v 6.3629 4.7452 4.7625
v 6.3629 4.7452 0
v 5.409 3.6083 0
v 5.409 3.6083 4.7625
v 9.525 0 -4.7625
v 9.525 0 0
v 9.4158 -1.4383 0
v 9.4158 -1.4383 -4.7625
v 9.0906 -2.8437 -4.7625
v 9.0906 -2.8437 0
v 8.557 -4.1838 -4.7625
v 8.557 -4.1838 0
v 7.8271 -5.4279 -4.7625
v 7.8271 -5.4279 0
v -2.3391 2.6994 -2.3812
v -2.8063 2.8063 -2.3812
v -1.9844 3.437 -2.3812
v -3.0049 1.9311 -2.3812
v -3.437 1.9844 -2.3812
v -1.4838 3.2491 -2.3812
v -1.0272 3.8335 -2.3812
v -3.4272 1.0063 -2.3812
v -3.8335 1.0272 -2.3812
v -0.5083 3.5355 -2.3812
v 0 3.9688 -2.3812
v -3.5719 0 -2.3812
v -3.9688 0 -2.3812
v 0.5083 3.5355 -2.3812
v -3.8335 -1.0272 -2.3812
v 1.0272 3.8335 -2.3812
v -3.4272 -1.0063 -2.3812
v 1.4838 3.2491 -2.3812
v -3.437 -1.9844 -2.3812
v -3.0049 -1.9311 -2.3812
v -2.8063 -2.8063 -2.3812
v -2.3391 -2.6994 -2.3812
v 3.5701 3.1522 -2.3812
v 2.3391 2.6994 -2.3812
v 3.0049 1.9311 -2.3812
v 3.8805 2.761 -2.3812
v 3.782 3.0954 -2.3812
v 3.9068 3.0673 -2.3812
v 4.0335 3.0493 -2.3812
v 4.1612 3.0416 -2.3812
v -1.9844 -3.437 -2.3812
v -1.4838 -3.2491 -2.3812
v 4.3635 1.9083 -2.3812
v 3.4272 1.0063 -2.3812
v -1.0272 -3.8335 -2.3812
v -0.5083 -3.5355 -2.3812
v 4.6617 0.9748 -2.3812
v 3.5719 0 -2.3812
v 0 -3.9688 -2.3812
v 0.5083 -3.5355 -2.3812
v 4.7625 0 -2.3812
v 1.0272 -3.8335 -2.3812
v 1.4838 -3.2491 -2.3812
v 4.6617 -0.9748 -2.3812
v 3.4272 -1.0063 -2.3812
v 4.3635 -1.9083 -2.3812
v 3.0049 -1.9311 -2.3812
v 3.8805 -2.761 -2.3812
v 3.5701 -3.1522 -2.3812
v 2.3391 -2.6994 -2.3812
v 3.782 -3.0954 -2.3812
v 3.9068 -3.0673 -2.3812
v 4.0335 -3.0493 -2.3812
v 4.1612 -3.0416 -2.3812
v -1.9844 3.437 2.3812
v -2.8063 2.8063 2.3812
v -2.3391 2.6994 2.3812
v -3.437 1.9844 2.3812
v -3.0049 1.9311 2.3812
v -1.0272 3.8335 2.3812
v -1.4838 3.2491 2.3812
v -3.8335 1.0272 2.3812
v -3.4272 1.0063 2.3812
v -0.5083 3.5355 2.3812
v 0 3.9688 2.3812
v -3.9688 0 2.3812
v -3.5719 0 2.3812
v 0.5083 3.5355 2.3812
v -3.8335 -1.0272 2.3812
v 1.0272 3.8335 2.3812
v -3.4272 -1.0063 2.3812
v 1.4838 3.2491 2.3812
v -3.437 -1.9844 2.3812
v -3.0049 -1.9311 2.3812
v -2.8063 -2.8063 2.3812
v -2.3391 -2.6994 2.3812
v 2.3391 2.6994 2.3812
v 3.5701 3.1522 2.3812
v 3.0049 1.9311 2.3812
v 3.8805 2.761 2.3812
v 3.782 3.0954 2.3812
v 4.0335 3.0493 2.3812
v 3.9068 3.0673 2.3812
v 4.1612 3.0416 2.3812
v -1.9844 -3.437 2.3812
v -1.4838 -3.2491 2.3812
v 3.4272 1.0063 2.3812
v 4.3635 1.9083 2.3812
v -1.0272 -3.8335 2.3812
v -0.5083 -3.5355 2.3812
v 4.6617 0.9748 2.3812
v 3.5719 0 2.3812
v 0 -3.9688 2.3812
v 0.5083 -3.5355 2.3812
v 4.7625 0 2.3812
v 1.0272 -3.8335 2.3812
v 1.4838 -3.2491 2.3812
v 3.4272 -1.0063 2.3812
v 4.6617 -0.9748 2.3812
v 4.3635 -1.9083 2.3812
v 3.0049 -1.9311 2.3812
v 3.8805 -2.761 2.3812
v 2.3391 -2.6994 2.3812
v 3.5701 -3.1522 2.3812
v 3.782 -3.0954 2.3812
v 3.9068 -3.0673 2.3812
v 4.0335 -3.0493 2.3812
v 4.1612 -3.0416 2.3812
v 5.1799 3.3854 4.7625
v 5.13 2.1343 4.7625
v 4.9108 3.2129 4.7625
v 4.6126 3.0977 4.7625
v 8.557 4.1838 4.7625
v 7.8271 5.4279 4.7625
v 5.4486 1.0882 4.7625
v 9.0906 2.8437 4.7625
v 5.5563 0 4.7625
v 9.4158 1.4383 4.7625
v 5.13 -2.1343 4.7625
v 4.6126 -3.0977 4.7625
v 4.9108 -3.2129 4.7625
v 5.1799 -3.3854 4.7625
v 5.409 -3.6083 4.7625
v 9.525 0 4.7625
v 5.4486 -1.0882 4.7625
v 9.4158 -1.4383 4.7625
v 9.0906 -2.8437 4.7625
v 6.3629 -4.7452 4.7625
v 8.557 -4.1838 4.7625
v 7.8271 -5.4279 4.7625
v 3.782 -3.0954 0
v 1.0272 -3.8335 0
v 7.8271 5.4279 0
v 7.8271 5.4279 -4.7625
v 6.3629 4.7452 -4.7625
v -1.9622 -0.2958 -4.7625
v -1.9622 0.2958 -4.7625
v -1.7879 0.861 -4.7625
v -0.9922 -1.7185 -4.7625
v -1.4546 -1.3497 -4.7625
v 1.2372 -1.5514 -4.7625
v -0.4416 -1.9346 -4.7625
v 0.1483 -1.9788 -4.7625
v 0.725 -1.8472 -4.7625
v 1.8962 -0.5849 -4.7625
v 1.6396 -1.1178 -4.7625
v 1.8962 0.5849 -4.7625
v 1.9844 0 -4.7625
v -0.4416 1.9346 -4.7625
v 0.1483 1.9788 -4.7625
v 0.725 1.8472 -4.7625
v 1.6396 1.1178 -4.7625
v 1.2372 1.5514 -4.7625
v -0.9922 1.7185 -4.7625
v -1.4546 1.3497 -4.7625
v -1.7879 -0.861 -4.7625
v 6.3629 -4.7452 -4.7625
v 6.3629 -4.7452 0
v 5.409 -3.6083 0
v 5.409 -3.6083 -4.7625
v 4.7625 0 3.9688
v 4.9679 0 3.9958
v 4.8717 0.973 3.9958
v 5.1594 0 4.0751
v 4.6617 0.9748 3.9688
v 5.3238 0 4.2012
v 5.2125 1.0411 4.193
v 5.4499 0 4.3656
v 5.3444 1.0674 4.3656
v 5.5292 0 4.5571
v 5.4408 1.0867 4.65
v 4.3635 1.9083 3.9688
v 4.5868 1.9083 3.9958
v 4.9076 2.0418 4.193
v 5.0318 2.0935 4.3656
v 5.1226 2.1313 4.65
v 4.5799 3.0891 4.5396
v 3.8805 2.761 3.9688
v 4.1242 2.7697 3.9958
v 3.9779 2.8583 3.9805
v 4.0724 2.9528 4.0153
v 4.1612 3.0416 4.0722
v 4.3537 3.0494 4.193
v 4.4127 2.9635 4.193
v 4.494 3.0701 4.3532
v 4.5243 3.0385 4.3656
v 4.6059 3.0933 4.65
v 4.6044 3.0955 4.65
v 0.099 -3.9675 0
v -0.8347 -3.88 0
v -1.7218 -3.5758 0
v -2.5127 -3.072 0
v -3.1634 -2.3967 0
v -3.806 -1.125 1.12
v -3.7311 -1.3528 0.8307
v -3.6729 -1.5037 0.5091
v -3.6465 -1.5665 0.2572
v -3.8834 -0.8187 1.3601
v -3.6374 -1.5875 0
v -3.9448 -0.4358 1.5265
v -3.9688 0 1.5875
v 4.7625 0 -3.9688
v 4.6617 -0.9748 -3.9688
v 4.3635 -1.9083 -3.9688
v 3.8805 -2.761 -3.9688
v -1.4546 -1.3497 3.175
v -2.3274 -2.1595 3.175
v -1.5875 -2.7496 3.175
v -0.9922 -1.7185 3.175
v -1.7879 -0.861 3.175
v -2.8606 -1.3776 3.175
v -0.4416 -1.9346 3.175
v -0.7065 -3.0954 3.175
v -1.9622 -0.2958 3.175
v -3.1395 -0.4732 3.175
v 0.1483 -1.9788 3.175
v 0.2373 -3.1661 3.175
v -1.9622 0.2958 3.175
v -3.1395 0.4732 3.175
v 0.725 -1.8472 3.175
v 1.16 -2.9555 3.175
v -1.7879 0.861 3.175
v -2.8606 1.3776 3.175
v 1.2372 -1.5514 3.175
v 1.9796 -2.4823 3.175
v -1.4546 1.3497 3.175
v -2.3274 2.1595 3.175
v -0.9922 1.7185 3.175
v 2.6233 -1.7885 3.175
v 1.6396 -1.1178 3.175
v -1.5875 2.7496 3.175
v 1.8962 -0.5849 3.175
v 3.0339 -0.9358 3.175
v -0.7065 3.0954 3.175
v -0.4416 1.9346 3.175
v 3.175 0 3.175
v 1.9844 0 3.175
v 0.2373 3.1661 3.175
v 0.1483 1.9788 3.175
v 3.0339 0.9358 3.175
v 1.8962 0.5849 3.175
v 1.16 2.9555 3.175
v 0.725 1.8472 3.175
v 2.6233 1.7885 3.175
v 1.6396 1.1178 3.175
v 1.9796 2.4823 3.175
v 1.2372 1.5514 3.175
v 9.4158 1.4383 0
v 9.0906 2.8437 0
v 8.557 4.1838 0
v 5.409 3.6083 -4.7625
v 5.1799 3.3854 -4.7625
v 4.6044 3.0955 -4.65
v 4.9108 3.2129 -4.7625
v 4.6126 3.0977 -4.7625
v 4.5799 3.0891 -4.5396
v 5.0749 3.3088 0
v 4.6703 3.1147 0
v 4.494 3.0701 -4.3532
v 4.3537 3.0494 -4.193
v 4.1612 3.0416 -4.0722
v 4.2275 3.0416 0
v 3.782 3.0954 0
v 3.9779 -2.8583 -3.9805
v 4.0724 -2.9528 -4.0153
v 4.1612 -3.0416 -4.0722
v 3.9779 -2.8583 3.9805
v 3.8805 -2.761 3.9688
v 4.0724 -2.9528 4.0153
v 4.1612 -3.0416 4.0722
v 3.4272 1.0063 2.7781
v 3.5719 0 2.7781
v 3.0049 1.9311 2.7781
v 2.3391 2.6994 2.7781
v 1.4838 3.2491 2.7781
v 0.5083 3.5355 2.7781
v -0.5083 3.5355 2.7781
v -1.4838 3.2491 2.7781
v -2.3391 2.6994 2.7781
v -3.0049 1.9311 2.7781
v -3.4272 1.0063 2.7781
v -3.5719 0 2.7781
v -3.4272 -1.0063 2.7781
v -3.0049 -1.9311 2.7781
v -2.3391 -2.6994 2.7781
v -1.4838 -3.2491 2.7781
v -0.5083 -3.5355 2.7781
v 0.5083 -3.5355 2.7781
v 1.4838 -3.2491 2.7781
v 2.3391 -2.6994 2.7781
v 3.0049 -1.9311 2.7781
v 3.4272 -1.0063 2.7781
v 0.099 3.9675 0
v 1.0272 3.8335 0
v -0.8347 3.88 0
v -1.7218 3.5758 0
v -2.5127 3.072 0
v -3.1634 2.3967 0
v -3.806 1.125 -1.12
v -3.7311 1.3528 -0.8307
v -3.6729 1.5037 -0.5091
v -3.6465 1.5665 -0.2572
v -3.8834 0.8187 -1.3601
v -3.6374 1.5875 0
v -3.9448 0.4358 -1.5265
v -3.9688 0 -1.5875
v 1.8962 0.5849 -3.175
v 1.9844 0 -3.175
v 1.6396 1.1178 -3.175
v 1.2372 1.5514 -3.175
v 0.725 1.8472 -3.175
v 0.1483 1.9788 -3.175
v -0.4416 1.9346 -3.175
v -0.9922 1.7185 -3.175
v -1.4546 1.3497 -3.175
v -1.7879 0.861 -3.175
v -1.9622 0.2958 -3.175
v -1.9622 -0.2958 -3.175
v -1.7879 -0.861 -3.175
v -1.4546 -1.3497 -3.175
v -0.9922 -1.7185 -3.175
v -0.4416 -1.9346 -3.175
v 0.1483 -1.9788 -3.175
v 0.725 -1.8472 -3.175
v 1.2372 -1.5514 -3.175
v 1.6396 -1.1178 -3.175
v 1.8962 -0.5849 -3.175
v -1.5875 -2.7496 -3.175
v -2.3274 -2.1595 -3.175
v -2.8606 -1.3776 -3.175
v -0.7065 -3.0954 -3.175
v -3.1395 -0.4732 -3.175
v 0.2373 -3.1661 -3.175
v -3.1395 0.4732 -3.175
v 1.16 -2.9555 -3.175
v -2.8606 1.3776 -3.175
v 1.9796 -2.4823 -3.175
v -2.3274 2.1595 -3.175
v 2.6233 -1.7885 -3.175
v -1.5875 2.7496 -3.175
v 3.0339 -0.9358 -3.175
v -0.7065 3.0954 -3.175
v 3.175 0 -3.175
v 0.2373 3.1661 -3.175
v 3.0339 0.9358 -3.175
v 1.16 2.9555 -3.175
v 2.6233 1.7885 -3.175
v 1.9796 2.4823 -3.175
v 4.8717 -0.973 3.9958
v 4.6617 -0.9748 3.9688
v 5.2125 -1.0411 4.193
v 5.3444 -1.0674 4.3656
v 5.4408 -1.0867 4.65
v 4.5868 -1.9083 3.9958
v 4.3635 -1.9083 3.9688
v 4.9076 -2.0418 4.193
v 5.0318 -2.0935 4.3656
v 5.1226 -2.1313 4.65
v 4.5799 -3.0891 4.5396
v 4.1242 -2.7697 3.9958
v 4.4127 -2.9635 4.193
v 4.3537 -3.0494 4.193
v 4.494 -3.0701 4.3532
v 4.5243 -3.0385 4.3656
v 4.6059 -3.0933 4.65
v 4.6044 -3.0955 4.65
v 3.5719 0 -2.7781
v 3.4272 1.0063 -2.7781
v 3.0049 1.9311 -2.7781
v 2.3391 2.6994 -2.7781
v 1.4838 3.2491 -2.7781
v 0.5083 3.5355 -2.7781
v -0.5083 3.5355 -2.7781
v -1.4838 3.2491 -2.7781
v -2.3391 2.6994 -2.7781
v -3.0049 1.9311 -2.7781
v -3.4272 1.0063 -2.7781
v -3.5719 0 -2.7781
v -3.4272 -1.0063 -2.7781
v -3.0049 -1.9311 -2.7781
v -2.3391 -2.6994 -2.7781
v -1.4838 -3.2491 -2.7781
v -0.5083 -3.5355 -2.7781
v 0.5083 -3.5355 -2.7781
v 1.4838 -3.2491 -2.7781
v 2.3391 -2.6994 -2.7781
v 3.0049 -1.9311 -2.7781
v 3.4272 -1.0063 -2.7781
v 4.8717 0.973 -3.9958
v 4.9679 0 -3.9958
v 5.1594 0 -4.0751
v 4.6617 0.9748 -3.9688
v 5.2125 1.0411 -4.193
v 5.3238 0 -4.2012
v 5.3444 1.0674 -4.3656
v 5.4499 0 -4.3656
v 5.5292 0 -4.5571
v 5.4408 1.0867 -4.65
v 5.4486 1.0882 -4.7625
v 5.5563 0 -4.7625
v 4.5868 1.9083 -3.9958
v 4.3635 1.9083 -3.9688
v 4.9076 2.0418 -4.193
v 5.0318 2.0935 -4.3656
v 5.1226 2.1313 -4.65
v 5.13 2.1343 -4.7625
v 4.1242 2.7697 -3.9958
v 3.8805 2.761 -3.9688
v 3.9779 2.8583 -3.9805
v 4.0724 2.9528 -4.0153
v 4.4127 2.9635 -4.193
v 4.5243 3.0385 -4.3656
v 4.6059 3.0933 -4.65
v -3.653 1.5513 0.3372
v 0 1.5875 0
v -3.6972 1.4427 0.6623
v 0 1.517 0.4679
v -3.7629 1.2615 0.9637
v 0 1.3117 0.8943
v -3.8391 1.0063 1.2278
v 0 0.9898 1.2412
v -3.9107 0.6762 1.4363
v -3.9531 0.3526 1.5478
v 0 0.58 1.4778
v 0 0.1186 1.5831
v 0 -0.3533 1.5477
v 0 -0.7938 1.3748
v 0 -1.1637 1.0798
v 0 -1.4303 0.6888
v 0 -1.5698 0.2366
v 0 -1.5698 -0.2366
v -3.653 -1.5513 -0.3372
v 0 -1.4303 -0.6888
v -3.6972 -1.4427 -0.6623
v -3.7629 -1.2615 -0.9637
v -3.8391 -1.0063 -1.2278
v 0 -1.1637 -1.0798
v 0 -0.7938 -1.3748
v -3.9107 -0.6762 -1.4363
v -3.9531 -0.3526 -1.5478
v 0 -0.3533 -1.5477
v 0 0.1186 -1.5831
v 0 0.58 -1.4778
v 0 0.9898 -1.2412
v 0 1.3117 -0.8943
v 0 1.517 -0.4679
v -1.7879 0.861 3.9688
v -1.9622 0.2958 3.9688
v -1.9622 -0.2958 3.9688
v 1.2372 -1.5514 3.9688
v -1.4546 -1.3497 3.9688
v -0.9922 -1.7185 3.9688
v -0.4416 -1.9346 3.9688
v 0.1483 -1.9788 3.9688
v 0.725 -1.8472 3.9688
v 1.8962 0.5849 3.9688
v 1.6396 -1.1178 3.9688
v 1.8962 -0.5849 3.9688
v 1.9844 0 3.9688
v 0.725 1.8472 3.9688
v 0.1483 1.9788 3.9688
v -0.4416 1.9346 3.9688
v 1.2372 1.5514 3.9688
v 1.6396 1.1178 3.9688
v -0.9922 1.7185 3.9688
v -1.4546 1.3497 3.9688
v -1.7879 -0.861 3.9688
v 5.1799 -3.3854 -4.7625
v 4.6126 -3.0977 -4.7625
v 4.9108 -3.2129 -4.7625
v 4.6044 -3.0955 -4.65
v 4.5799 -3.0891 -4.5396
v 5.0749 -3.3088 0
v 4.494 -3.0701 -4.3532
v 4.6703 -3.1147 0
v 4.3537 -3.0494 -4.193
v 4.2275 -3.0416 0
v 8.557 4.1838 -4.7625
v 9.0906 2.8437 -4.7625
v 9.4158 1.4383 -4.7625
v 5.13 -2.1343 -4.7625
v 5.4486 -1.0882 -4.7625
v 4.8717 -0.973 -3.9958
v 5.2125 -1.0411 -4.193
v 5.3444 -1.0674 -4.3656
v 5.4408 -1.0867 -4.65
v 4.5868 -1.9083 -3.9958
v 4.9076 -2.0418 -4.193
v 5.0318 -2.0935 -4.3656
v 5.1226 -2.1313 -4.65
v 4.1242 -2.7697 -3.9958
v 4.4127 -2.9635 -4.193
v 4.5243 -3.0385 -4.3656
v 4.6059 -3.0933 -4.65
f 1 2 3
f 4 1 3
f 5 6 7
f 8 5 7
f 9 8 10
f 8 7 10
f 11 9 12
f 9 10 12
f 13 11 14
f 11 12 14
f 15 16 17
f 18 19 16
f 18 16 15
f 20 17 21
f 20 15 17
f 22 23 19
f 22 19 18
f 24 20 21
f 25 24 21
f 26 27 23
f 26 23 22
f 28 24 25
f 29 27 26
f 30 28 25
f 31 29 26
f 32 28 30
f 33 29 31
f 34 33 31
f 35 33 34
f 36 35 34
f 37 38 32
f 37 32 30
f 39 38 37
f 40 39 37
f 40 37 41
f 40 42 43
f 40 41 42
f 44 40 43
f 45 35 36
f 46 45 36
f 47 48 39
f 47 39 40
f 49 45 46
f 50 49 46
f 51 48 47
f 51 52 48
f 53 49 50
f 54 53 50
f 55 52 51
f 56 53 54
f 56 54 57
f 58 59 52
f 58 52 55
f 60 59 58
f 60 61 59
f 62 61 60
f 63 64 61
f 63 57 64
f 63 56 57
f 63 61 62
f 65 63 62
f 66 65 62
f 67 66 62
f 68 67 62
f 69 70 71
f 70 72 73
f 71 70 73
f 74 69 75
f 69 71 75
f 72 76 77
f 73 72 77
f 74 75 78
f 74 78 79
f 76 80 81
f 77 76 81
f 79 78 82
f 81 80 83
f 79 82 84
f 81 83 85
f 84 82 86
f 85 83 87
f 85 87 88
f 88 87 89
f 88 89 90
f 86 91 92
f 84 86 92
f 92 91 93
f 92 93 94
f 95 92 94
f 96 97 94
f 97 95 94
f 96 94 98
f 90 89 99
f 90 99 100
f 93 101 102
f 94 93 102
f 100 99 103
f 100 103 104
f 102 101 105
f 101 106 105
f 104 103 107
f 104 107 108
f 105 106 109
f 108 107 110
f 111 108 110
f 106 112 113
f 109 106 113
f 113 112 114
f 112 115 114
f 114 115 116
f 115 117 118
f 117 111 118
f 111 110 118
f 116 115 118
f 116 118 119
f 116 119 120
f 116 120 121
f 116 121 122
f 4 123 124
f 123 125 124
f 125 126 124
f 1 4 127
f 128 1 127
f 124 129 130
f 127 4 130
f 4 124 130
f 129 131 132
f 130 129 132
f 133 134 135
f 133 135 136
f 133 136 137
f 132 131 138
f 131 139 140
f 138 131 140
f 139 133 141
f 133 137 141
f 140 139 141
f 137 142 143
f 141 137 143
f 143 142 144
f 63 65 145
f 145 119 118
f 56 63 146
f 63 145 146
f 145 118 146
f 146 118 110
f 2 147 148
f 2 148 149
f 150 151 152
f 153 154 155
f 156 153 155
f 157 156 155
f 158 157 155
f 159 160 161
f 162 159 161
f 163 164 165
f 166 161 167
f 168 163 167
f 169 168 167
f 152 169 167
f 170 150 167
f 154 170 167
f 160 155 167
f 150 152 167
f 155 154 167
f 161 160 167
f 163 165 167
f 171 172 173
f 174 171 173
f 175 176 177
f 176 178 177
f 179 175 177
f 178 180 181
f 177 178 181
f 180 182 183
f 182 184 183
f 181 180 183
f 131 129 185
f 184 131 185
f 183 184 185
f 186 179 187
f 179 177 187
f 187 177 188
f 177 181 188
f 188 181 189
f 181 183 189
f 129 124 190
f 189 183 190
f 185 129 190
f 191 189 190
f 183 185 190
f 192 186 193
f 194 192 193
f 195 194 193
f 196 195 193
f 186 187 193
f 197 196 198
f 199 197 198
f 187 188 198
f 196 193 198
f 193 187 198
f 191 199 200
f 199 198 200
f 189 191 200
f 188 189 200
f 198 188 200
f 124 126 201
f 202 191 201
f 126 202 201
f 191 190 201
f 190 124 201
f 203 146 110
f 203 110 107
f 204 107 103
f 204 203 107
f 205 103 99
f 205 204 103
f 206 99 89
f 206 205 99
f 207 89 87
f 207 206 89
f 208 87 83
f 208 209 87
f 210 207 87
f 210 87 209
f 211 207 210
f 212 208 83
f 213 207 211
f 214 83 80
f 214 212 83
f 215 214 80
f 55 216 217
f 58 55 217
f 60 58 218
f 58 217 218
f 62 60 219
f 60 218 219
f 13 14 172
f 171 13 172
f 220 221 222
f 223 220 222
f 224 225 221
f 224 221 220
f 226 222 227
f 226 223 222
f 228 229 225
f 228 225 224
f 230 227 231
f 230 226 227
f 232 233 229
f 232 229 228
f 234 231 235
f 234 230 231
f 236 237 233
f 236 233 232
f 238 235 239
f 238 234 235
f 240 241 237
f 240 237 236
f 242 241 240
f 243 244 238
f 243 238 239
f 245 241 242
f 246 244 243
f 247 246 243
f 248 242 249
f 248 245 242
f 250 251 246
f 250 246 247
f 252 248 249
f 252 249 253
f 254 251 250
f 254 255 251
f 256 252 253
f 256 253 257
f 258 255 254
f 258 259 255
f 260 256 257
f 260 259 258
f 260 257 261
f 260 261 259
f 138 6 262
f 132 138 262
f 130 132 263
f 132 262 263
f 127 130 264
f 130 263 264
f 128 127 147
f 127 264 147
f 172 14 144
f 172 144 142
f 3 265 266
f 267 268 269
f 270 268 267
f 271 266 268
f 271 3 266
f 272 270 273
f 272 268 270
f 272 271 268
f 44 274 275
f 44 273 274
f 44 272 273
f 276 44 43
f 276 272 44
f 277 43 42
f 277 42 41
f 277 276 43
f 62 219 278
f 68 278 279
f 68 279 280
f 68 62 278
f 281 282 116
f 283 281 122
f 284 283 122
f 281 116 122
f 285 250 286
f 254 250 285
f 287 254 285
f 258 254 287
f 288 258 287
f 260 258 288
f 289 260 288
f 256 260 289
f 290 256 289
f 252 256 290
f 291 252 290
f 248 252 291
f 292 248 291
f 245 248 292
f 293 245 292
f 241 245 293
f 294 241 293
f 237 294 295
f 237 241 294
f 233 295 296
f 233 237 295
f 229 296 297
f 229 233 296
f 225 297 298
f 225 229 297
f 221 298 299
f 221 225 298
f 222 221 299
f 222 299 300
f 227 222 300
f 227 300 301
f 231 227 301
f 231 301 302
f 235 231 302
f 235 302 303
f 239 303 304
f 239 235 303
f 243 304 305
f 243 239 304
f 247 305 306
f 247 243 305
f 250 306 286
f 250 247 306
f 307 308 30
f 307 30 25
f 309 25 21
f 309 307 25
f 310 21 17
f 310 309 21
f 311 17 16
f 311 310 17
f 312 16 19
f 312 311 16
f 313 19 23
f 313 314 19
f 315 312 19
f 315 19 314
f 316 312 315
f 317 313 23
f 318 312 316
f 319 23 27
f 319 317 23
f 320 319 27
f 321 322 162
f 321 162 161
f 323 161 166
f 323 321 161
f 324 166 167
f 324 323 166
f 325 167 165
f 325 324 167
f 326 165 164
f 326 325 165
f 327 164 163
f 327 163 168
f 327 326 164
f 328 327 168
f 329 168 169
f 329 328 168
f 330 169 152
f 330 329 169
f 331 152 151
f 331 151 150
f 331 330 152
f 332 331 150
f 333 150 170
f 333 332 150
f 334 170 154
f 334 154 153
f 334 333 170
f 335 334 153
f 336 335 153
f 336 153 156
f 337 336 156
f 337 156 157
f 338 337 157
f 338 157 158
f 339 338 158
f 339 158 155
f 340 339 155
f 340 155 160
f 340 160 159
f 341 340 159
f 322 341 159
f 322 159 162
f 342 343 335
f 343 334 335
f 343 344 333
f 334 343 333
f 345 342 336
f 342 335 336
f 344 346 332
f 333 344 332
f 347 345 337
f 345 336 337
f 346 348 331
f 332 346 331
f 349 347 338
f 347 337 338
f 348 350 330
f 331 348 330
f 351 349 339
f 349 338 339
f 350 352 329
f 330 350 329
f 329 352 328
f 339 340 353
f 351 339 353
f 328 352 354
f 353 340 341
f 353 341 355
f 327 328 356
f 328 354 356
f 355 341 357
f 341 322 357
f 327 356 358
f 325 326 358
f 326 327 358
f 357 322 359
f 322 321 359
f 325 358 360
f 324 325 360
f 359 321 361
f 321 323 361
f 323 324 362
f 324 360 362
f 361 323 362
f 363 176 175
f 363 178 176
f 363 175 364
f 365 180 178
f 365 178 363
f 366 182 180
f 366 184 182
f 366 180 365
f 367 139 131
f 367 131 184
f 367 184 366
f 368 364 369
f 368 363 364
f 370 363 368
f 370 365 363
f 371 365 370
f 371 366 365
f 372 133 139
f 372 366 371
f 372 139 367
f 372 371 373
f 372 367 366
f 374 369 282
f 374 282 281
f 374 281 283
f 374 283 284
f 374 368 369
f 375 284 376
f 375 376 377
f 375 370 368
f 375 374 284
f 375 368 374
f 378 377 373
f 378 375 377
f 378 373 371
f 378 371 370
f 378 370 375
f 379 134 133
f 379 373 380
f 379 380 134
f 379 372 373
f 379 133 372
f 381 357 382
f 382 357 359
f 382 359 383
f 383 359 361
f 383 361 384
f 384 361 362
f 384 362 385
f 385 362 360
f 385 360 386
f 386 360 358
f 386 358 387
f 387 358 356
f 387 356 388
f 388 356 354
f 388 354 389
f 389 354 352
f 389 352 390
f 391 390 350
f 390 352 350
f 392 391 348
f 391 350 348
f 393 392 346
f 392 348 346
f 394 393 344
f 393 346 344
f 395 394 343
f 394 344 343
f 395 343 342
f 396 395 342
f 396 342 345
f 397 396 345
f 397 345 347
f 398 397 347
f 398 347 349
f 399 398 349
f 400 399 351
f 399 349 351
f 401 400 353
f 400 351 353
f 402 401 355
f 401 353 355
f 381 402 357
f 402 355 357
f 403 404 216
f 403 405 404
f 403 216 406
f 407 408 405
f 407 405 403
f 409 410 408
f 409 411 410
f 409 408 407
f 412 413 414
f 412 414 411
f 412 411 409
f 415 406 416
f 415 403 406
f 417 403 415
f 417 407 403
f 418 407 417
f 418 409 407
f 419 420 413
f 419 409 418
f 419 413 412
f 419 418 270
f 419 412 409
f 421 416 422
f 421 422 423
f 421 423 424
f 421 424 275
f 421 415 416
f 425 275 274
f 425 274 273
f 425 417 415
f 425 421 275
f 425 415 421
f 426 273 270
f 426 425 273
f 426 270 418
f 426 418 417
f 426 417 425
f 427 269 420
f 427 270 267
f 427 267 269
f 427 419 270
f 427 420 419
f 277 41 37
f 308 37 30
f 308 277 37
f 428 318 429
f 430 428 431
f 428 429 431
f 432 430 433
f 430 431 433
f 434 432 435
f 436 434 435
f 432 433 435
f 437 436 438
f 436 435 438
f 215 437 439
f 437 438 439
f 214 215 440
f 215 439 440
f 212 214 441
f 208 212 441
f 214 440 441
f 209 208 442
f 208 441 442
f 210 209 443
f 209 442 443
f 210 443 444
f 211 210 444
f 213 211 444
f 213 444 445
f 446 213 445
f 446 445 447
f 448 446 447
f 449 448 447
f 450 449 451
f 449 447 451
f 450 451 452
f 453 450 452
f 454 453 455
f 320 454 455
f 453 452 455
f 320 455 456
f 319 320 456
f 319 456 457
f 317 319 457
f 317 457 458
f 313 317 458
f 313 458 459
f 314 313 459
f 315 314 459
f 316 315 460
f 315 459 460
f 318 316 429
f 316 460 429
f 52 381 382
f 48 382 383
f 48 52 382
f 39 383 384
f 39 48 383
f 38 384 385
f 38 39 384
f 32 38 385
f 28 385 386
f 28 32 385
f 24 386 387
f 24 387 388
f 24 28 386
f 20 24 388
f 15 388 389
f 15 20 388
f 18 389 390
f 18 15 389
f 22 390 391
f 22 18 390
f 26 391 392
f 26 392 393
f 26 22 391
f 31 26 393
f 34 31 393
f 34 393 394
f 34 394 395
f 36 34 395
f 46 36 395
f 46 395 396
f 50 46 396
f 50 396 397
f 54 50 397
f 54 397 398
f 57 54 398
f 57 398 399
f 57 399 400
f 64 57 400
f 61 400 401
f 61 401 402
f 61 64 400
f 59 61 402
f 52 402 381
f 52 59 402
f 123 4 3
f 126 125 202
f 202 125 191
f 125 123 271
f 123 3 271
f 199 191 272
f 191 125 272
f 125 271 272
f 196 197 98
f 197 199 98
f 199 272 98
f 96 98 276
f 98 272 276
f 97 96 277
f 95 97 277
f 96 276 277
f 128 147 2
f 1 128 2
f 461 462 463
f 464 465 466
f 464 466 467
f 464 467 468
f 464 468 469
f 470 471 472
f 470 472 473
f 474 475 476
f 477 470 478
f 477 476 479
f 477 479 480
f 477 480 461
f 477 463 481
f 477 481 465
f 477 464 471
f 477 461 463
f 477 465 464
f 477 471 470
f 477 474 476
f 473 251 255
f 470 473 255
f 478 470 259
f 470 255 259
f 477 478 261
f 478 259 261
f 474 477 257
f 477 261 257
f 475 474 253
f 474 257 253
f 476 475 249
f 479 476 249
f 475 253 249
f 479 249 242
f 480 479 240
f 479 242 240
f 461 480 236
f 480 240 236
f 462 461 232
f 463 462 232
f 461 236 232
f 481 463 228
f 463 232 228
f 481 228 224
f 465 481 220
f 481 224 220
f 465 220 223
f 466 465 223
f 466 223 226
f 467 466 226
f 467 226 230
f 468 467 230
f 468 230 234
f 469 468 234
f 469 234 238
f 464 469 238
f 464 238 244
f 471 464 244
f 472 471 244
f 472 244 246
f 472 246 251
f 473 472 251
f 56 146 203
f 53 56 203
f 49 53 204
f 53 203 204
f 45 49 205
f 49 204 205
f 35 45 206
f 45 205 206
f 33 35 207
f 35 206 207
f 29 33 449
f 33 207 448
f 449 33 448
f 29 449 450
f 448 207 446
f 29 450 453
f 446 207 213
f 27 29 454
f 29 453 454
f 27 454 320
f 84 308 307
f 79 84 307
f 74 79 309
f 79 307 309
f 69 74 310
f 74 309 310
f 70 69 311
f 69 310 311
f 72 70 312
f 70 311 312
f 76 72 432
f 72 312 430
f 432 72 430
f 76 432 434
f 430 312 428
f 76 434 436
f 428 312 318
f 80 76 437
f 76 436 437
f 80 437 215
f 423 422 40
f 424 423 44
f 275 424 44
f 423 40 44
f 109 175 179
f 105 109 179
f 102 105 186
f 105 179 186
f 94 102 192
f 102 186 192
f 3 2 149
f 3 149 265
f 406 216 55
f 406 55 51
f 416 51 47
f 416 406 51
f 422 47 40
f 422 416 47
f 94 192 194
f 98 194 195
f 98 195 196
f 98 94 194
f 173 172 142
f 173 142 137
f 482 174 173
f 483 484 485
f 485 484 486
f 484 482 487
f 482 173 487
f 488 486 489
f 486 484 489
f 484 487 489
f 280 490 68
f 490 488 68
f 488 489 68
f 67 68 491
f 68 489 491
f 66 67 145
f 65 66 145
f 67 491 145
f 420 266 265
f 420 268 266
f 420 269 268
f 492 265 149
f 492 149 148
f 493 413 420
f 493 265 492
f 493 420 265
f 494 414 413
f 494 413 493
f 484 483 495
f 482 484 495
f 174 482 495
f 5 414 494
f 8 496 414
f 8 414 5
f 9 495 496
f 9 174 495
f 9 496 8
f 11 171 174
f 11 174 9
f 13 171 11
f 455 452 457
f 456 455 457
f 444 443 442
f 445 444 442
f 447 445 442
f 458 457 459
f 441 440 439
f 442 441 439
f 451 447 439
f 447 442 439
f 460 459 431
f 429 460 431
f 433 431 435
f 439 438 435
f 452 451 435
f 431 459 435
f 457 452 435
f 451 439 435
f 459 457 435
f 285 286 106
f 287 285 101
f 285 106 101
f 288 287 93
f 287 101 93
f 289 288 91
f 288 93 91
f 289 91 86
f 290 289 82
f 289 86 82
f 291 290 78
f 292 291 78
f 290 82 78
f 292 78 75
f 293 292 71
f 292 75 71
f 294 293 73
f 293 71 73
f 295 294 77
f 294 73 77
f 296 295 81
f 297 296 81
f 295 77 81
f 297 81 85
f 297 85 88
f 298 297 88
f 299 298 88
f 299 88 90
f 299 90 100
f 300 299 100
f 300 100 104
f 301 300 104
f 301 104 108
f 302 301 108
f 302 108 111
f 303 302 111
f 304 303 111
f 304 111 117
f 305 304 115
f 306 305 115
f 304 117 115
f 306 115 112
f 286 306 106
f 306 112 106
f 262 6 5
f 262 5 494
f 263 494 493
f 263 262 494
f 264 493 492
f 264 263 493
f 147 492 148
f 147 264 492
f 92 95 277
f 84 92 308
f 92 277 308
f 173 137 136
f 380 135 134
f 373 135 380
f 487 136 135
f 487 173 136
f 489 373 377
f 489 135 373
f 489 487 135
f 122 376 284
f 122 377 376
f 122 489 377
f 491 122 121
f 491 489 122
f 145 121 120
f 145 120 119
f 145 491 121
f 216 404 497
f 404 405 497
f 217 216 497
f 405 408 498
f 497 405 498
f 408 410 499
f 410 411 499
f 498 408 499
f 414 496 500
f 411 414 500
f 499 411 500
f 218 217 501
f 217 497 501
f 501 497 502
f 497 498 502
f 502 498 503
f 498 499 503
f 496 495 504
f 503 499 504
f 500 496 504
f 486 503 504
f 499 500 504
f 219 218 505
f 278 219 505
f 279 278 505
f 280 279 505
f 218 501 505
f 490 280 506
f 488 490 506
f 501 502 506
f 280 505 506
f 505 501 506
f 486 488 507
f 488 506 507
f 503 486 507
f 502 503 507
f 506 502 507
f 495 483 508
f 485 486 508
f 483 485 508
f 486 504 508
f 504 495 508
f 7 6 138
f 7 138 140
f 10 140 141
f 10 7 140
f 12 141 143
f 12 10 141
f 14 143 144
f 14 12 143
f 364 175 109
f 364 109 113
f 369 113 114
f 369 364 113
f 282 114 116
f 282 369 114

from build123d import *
from build123d import SkipClean  # not in build123d's __all__

# Parameters (mm, degrees)
F1_DEPTH       = 4.7625
F3_DEPTH       = 2.38125
F4_R           = 0.79375
F8_DEPTH       = 25.4
F10_R          = 3.571875
F11_DEPTH      = 3.175
F13_SIZE2      = 0.396875
F13_SIZE       = 0.396875
F12_R          = 1.984375
F15_DEPTH      = 3.96875
F15_DEPTH_BACK = 4.7625
F16_R          = 1.5875
F17_DEPTH      = 25.4


with BuildPart() as f1:
    # F0 (on Top) → F1 (new body)
    with BuildSketch(Plane.XY):
        with BuildLine():
            Line((7.8270786991, 5.4279336804), (6.3629416959, 4.7451953832))
            Line((6.3629416959, 4.7451953832), (5.4090072937, 3.6083406323))
            ThreePointArc((5.4090072937, 3.6083406323), (4.670282197, 3.1147403034), (3.7820365062, 3.0953587134))
            Line((3.7820365062, 3.0953587134), (1.0271880853, 3.8335181231))
            ThreePointArc((1.0271880853, 3.8335181231), (-2.4160219214, 3.1486210693), (-3.96875, 0))
            Line((-3.96875, 0), (9.525, 0))
            ThreePointArc((9.525, 0), (9.0906146549, 2.8436508568), (7.8270786991, 5.4279336804))
        make_face()
    extrude(amount=F1_DEPTH)

    # F2 (on face) → F3 (cut)
    with BuildSketch(Plane.XY.offset(4.7625)):
        with BuildLine():
            Line((3.5700563335, 3.1521586295), (1.0271880853, 3.8335181231))
            ThreePointArc((1.0271880853, 3.8335181231), (-2.4160219214, 3.1486210693), (-3.96875, 0))
            Line((-3.96875, 0), (4.7625, 0))
            ThreePointArc((4.7625, 0), (4.4544247405, 1.6850835234), (3.5700563335, 3.1521586295))
        make_face()
    extrude(amount=-F3_DEPTH, mode=Mode.SUBTRACT)

    # F6: sweep along a path in F5
    with BuildLine(Plane.XY.offset(4.7625)) as f6_path:
        ThreePointArc((4.7625, 0), (4.4544247405, 1.6850835234), (3.5700563335, 3.1521586295))
    # F4 (on Front) → F6 (sweep, cut)
    with BuildSketch(Plane.XZ):
        with Locations((4.7625, 4.7625)):
            Circle(F4_R)
    sweep(path=f6_path.line, mode=Mode.SUBTRACT)

    # F7 (on face) → F8 (cut)
    with BuildSketch(Plane.XY.offset(2.38125)):
        with BuildLine():
            ThreePointArc((3.5700563335, 3.1521586295), (3.7304279124, 2.9606272714), (3.880535973, 2.7609503459))
            Line((3.880535973, 2.7609503459), (4.1611689768, 3.0415833497))
            Line((4.1611689768, 3.0415833497), (4.1606985033, 3.6664465442))
            Line((4.1606985033, 3.6664465442), (2.6852940209, 3.5708183423))
            Line((2.6852940209, 3.5708183423), (3.1285953124, 3.2704477536))
            Line((3.1285953124, 3.2704477536), (3.5700563335, 3.1521586295))
        make_face()
    extrude(amount=F8_DEPTH, mode=Mode.SUBTRACT)

    # F9: F1 across face


with BuildPart() as f1_1:
    add(f1.part, clean=False)
    with SkipClean():  # cleaning this boolean's faces spoils the solid; the shape is the same uncleaned
        add(f1.part.mirror(Plane(origin=(3.9033700373, 0, 1.7817262918), x_dir=(1, 0, 0), z_dir=(0, -1, 0))), clean=False)

    # F10 (on Top) → F11 (join)
    with BuildSketch(Plane.XY):
        Circle(F10_R)
    extrude(amount=F11_DEPTH)

    # F13
    f13_edges = [f1_1.edges().sort_by_distance(p)[0] for p in [
        (-3.571875, 0, 3.175),
    ]]
    chamfer(f13_edges, length=F13_SIZE, length2=F13_SIZE2)

    # F14: F1 across plane


with BuildPart() as f1_2:
    add(f1_1.part, clean=False)
    add(f1_1.part.mirror(Plane.XY), clean=False)

    # F12 (on Top) → F15 (join, two sides)
    with BuildSketch(Plane.XY) as f15_sk:
        Circle(F12_R)
    with SkipClean():  # cleaning this boolean's faces spoils the solid; the shape is the same uncleaned
        extrude(amount=F15_DEPTH)
        extrude(f15_sk.sketch, amount=-F15_DEPTH_BACK)

    # F16 (on Right) → F17 (cut)
    with BuildSketch(Plane.YZ):
        Circle(F16_R)
    with SkipClean():  # cleaning this boolean's faces spoils the solid; the shape is the same uncleaned
        extrude(amount=-F17_DEPTH, mode=Mode.SUBTRACT)


solid = f1_2.part
